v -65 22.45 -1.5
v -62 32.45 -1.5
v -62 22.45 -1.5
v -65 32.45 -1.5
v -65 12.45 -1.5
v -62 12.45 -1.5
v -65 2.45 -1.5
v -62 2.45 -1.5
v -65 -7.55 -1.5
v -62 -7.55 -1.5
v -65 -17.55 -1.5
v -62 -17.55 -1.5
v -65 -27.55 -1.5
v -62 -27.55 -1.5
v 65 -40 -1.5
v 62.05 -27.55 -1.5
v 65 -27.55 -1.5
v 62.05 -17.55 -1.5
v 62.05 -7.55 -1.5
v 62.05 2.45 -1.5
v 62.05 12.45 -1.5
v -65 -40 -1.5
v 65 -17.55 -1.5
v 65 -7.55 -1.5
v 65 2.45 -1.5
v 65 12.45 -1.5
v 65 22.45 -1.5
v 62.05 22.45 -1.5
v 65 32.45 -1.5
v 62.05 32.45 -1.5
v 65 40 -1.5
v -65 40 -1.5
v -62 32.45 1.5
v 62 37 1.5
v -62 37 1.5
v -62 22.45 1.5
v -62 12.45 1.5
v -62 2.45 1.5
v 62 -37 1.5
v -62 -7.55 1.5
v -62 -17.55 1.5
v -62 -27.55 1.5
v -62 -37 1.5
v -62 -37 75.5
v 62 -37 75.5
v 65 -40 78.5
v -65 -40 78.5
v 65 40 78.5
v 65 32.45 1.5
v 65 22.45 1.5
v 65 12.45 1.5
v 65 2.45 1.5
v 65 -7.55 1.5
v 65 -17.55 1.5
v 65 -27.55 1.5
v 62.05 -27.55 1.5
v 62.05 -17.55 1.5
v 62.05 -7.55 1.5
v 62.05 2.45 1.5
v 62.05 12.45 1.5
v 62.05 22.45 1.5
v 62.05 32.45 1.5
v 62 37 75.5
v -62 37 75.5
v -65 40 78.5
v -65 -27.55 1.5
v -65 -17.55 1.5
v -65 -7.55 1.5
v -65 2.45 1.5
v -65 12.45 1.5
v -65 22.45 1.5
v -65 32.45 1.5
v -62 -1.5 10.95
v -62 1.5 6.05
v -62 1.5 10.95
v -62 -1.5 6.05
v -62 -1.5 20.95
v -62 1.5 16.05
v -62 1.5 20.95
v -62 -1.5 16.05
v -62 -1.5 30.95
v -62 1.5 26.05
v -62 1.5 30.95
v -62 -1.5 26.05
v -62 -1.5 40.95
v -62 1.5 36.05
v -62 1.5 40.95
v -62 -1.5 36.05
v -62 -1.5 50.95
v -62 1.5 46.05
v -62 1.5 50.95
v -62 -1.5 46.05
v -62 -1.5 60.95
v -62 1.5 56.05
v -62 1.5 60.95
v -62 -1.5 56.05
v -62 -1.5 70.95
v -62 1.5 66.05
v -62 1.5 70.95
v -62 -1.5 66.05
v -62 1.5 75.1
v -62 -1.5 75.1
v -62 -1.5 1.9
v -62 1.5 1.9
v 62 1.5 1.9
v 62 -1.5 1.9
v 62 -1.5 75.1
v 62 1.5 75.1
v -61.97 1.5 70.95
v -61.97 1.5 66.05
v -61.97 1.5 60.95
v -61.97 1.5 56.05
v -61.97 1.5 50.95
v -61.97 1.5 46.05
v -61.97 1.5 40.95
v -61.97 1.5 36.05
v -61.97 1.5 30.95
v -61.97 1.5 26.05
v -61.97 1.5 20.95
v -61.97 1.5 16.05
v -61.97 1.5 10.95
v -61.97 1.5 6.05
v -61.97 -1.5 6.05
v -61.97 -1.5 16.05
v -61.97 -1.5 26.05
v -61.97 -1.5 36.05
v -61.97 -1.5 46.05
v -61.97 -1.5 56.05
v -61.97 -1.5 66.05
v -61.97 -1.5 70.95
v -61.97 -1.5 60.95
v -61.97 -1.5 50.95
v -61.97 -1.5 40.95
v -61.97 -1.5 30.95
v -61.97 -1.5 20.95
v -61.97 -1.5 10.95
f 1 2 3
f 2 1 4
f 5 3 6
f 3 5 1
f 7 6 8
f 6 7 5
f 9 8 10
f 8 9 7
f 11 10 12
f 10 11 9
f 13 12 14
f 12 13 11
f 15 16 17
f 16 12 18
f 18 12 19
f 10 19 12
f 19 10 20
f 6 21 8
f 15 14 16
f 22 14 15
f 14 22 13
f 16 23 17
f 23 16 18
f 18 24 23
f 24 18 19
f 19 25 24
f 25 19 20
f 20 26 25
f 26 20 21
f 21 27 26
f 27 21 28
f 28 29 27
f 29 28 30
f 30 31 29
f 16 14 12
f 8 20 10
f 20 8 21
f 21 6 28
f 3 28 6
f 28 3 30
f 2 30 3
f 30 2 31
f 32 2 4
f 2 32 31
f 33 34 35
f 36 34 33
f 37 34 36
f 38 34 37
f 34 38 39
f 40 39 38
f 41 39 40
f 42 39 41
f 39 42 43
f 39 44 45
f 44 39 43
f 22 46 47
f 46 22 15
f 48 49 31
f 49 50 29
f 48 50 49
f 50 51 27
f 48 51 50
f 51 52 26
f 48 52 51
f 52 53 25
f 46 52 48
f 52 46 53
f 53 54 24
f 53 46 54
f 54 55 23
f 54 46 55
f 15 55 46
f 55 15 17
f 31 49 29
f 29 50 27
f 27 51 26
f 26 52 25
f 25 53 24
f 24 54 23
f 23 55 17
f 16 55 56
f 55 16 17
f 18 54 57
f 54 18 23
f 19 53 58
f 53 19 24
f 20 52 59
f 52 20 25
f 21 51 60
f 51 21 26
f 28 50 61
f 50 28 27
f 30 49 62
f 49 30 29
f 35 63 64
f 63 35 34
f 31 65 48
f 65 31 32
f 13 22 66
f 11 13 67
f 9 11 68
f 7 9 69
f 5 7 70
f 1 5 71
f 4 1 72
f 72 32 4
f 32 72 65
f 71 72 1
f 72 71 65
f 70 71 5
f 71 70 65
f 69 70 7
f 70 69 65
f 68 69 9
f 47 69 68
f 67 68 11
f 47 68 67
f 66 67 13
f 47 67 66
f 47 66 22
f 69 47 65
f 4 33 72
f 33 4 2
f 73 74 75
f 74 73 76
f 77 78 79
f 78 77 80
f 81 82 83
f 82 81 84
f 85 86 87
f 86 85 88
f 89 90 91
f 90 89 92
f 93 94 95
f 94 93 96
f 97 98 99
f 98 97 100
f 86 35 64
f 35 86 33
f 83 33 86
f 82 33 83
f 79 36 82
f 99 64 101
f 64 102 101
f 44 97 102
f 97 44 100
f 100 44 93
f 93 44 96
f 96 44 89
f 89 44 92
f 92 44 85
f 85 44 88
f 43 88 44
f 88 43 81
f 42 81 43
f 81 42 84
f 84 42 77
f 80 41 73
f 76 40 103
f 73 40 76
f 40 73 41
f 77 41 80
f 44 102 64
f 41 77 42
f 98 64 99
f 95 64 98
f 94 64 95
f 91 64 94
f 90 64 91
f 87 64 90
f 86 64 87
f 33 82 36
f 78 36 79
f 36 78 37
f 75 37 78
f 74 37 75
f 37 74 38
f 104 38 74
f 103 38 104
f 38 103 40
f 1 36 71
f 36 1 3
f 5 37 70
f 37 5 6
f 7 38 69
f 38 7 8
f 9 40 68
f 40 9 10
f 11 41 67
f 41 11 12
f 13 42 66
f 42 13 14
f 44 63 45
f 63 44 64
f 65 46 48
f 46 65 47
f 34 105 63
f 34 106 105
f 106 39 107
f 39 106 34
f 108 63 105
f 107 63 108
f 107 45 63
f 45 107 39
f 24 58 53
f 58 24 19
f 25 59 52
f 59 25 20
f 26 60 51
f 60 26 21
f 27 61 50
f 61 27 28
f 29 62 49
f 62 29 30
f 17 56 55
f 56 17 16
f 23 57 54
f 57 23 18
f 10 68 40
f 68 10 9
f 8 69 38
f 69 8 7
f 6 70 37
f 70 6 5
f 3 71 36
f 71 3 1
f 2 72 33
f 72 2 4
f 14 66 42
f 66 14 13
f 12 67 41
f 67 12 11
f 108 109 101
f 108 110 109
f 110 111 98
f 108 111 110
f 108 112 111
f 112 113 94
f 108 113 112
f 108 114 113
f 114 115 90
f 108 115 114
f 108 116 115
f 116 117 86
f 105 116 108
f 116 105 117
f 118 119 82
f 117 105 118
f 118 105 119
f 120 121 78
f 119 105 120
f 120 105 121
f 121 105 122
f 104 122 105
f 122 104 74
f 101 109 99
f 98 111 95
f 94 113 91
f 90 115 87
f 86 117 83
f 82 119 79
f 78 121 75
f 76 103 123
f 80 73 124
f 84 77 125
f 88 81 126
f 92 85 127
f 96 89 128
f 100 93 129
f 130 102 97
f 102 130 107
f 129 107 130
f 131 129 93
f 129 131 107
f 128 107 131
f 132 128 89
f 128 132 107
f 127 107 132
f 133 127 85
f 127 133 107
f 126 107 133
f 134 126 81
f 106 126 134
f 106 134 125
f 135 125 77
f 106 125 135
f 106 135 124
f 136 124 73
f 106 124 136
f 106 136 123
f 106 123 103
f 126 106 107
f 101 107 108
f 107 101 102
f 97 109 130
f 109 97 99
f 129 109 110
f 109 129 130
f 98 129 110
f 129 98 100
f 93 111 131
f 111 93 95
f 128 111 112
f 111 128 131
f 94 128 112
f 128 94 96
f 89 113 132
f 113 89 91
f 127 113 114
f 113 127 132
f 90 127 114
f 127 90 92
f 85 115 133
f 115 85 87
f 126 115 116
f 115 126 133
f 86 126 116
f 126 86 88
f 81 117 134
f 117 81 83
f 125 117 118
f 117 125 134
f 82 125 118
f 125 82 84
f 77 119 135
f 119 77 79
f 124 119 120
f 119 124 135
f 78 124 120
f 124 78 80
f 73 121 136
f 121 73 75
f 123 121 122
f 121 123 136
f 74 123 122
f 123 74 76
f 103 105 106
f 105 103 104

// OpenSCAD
/*
Create a laser cut box with for a useless machine

*/

/* [Box OUTSIDE Dimensions] */
//Box Width (X)
bX=130;
//Box Depth (Y)
bY=80;
//Box Height (Z)
bZ=80;
//Material Thickness
cutD=3;
//include a lid?
addLid=1; //[1:Lid, 0:No Lid]

/* [Finger Width] */
//Finger  width (cutW < 1/3 shortest side)
cutW=5;//[3:20]
//Finger width on lid (cutWlid < 1/3 shorter of X/Y dimension)
cutWlid=25;//[3:30]
//Laser kerf (1/2 inside, 1/2 outside of laser path)
kerf=0.1;

/* [Layout] */
//separation of finished pieces
separation=1;
//transparency of 3D model
alpha=50; //[1:100]
//2D or 3D Layout
2D=0; //[1:2D for DXF, 0:3D for STL]



/* [Hidden] */
//Calculate the maximum number of tabs and slots
maxDivX=floor(bX/cutW);
maxDivY=floor(bY/cutW);
maxDivZ=floor(bZ/cutW);

//NB! the maximum usable divisions MUST be odd
uDivX= (maxDivX%2)==0 ? maxDivX-3 : maxDivX-2;
uDivY= (maxDivY%2)==0 ? maxDivY-3 : maxDivY-2;
uDivZ= (maxDivZ%2)==0 ? maxDivZ-3 : maxDivZ-2;

alp=1-alpha/100;


//cuts that fall completely insde the edges
module insideCuts(len, cutWidth, cutDepth, uDiv, lKerf=0.1) {

  //Calculate the number of tabs and slots
  numTabs=floor(uDiv/2);
  numSlots=ceil(uDiv/2);

  //draw out rectangles for slots
  for (i=[0:numSlots-1]) {
    translate([i*(cutWidth*2)+lKerf/2, 0, 0])
      square([cutWidth-lKerf, cutDepth]);
  }
}


//cuts that fall at the end of an edge
module outsideCuts(len, cutWidth, cutDepth, uDiv, lKerf=0.1, endCut) {

  numSlots=floor(uDiv/2);

  //padding - sift all the slots by the amount equal to tend cut plus one division
  padding=endCut+cutWidth;

  //first endcut
  square([endCut+lKerf/2, cutD]);

  //draw all the normal slots plus the last endcut
  for (i=[0:numSlots]) {
    if (i < numSlots) {
      translate([i*(cutWidth*2)+padding-lKerf/2, 0, 0])
        square([cutWidth+lKerf, cutDepth]);
    } else {
      translate([i*(cutWidth*2)+padding-lKerf/2, 0, 0])
        square([endCut+lKerf/2, cutDepth]);
    }
  }
}

//Face A (X and Z dimension)
//Front and Back face
module faceA(uDivX, uDivZ, uDivLX) {
  difference() {
    square([bX, bZ], center=true);
    //X+/- edge (X axis in OpenSCAD)
    // if true, make cuts for the lid
    if (addLid) {
      //translate([-uDivX*cutW/2, bZ/2-cutD, 0])
      //  insideCuts(len=bX, cutWidth=cutW, cutDepth=cutD, uDiv=uDivX, lKerf=kerf);
      translate([-uDivLX*cutWlid/2, bZ/2-cutD, 0])
        insideCuts(len=bX, cutWidth=cutWlid, cutDepth=cutD, uDiv=uDivLX, lKerf=kerf);
    }
    translate([-uDivX*cutW/2, -bZ/2, 0])
      insideCuts(len=bX, cutWidth=cutW, cutDepth=cutD, uDiv=uDivX, lKerf=kerf);

    //Z+/- edge (Y axis in OpenSCAD)
    translate([bX/2-cutD+kerf/2, uDivZ*cutW/2, 0]) rotate([0, 0, -90])
      insideCuts(len=bZ, cutWidth=cutW, cutDepth=cutD, uDiv=uDivZ, lKerf=kerf);
    translate([-bX/2, uDivZ*cutW/2, 0]) rotate([0, 0, -90])
      insideCuts(len=bZ, cutWidth=cutW, cutDepth=cutD, uDiv=uDivZ, lKerf=kerf);
  }
}

//Face C (X and Y dimension)
//create a the lid and base
module faceB(uDivX, uDivY, uDivLX, uDivLY, lid=0) {

  
  //if this is the "lid" use cutWlid dimensions instead of cutW
  // create the local version of these variables

  uDivXloc= lid==1 ? uDivLX : uDivX;
  uDivYloc= lid==1 ? uDivLY : uDivY;
  cutWloc=  lid==1 ? cutWlid : cutW;

  /*
  if (lid) {
    uDivXloc=uDivLX;
    uDivYloc=uDivLY;
    cutWloc=cutWlid;
  } else {
    uDivXloc=uDivX;
    uDivYloc=uDivY;
    cutWloc=cutW;
  }*/
  
  endCutX=(bX-uDivXloc*cutWloc)/2;

  difference() {
    square([bX, bY], center=true);
    //X+/- edge (X axis in OpenSCAD)
    translate([(-uDivXloc*cutWloc/2)-endCutX, bY/2-cutD, 0])
    //Original: #translate([(-uDivX*cutW/2)-endCutX, bY/2-cutD+kerf/2, 0])
      outsideCuts(len=bX, cutWidth=cutWloc, cutDepth=cutD, uDiv=uDivXloc,
        lKerf=kerf, endCut=endCutX);
    translate([(-uDivXloc*cutWloc/2)-endCutX, -bY/2, 0])
      outsideCuts(len=bX, cutWidth=cutWloc, cutDepth=cutD, uDiv=uDivXloc,
        lKerf=kerf, endCut=endCutX);

    //Y+/- edge (Y axis in OpenSCAD)
    translate([bX/2-cutD+kerf/2, uDivYloc*cutWloc/2, 0]) rotate([0, 0, -90])
      insideCuts(len=bY, cutWidth=cutWloc, cutDepth=cutD, uDiv=uDivYloc, lKerf=kerf);
    translate([-bX/2, uDivYloc*cutWloc/2, 0]) rotate([0, 0, -90])
      insideCuts(len=bY, cutWidth=cutWloc, cutDepth=cutD, uDiv=uDivYloc, lKerf=kerf);

  }
}


module faceC(uDivY, uDivZ, uDivLY) {
  //amount to cut off at the end of an outside cut edge
  endCutY=(bY-uDivY*cutW)/2;
  endCutZ=(bZ-uDivZ*cutW)/2;
  endCutLY=(bY-uDivLY*cutWlid)/2;

  difference() {
      square([bY, bZ], center=true);
      //Y+/- edge (X axis in OpenSCAD)
      if(addLid) {
        translate([(-uDivLY*cutWlid/2)-endCutLY, bZ/2-cutD, 0])
          outsideCuts(len=bY, cutWidth=cutWlid, cutDepth=cutD, uDiv=uDivLY, lKerf=kerf,
            endCut=endCutLY);
      }
      translate([(-uDivY*cutW/2)-endCutY, -bZ/2, 0])
        outsideCuts(len=bY, cutWidth=cutW, cutDepth=cutD, uDiv=uDivY, lKerf=kerf,
          endCut=endCutY);

      //Z+/- edge (Y axis in OpenSCAD)
      translate([-bY/2, (uDivZ*cutW/2)+endCutZ, 0]) rotate([0, 0, -90])
        outsideCuts(len=bZ, cutWidth=cutW, cutDepth=cutD, uDiv=uDivZ, lKerf=kerf,
          endCut=endCutZ);
      translate([bY/2-cutD+kerf/2, (uDivZ*cutW/2)+endCutZ, 0]) rotate([0, 0, -90])
        outsideCuts(len=bZ, cutWidth=cutW, cutDepth=cutD, uDiv=uDivZ, lKerf=kerf,
          endCut=endCutZ);
    }
}

module layout2D(uDivX, uDivY, uDivZ, uDivLX, uDivLY) {
  translate()
    color("red") faceA(uDivX, uDivZ, uDivLX); 

  if (addLid) {
  translate([0, -bZ/2-bY/2-separation, 0])
    color("green") faceB(uDivX, uDivY, uDivLX, uDivLY, lid=1);
  }
  
  translate([bX/2+bY/2+separation, 0, 0])
    color("blue") faceC(uDivY, uDivZ, uDivLY);

  translate([bX+separation+bY+separation, 0, 0])
    color("darkred") faceA(uDivX, uDivZ, uDivLX);
  
  translate([bX/2+bY/2+separation, -bY, 0])
    color("navy") faceC(uDivY, uDivZ, uDivLY);

  translate([bX+separation+bY+separation, -bZ/2-bY/2-separation, 0])
    color("lime") faceB(uDivX, uDivY, lid=0);
}

module motorSupport(uDivZ) {
  echo(uDivZ);
  difference() {
    //Draw a board that is 98% - 2x material thickness to fit INSIDE box
    square([bX, bZ*.99-cutD*2], center=true);

    translate([bX/2-cutD, uDivZ*cutW/2, 0]) rotate([0, 0, -90])
      #insideCuts(len=bZ, cutWidth=cutW, cutDepth=cutD*1.01, uDiv=uDivZ, lKerf=kerf);

    translate([-bX/2, uDivZ*cutW/2, 0]) rotate([0, 0, -90])
      #insideCuts(len=bZ, cutWidth=cutW, cutDepth=cutD*1.01, uDiv=uDivZ, lKerf=kerf);

  
  }
}


module assemble3D(DivX, uDivY, uDivZ, uDivLX, uDivLY, alp=0.5) {
  //amount to shift for cut depth
  D=cutD/2;

  //bottom of box (B-)
  color("lime", alpha=alp)
    linear_extrude(height=cutD, center=true) faceB(uDivX, uDivY, lid=0);

  //lid of box (B+)
  if (addLid) {
  color("green", alpha=alp)
    translate([0, 0, bZ-cutD])
    linear_extrude(height=cutD, center=true) faceB(uDivX, uDivY, uDivLX, uDivLY, lid=1);
  }

  //faceA +/-
  color("red", alpha=alp)
    translate([0, bY/2-D, bZ/2-D]) rotate([90, 0, 0])
    linear_extrude(height=cutD, center=true) faceA(uDivX, uDivZ, uDivLX);
  color("darkred", alpha=alp)
    translate([0, -bY/2+D, bZ/2-D]) rotate([90, 0, 0])
    linear_extrude(height=cutD, center=true) faceA(uDivX, uDivZ, uDivLX);

  //FaceC +/-
  color("blue", alpha=alp)
    translate([bX/2-D, 0, bZ/2-D]) rotate([90, 0, 90])
    linear_extrude(height=cutD, center=true) faceC(uDivY, uDivZ, uDivLY);

  color("navy", alpha=alp)
    translate([-bX/2+D, 0, bZ/2-D]) rotate([90, 0, 90])
    linear_extrude(height=cutD, center=true) faceC(uDivY, uDivZ, uDivLY);

  color("orange", alpha=alp)
    translate([0, 0, bZ/2-D]) rotate([90, 0, 0])
    linear_extrude(height=cutD, center=true) motorSupport(uDivZ);

  

}

module main() {
  //Calculate the maximum number of tabs and slots
  maxDivX=floor(bX/cutW);
  maxDivY=floor(bY/cutW);
  maxDivZ=floor(bZ/cutW);

  // calculate the maximum number of tabs for the lid cut width
  maxDivLX=floor(bX/cutWlid);
  maxDivLY=floor(bY/cutWlid);

  //Usable divisions on the X, Y, Z edges
  //NB! the maximum usable divisions MUST be odd
  uDivX= (maxDivX%2)==0 ? maxDivX-3 : maxDivX-2;
  uDivY= (maxDivY%2)==0 ? maxDivY-3 : maxDivY-2;
  uDivZ= (maxDivZ%2)==0 ? maxDivZ-3 : maxDivZ-2;

  uDivLX= (maxDivLX%2)==0 ? maxDivLX-3 : maxDivLX-2;
  uDivLY= (maxDivLY%2)==0 ? maxDivLY-3 : maxDivLY-2;


  alp=1-alpha/100;

  if (2D) {
    layout2D(uDivX, uDivY, uDivZ, uDivLX, uDivLY); 
  } else {
    assemble3D(uDivX, uDivY, uDivZ, uDivLX, uDivLY, alp);
  }
}


main();
